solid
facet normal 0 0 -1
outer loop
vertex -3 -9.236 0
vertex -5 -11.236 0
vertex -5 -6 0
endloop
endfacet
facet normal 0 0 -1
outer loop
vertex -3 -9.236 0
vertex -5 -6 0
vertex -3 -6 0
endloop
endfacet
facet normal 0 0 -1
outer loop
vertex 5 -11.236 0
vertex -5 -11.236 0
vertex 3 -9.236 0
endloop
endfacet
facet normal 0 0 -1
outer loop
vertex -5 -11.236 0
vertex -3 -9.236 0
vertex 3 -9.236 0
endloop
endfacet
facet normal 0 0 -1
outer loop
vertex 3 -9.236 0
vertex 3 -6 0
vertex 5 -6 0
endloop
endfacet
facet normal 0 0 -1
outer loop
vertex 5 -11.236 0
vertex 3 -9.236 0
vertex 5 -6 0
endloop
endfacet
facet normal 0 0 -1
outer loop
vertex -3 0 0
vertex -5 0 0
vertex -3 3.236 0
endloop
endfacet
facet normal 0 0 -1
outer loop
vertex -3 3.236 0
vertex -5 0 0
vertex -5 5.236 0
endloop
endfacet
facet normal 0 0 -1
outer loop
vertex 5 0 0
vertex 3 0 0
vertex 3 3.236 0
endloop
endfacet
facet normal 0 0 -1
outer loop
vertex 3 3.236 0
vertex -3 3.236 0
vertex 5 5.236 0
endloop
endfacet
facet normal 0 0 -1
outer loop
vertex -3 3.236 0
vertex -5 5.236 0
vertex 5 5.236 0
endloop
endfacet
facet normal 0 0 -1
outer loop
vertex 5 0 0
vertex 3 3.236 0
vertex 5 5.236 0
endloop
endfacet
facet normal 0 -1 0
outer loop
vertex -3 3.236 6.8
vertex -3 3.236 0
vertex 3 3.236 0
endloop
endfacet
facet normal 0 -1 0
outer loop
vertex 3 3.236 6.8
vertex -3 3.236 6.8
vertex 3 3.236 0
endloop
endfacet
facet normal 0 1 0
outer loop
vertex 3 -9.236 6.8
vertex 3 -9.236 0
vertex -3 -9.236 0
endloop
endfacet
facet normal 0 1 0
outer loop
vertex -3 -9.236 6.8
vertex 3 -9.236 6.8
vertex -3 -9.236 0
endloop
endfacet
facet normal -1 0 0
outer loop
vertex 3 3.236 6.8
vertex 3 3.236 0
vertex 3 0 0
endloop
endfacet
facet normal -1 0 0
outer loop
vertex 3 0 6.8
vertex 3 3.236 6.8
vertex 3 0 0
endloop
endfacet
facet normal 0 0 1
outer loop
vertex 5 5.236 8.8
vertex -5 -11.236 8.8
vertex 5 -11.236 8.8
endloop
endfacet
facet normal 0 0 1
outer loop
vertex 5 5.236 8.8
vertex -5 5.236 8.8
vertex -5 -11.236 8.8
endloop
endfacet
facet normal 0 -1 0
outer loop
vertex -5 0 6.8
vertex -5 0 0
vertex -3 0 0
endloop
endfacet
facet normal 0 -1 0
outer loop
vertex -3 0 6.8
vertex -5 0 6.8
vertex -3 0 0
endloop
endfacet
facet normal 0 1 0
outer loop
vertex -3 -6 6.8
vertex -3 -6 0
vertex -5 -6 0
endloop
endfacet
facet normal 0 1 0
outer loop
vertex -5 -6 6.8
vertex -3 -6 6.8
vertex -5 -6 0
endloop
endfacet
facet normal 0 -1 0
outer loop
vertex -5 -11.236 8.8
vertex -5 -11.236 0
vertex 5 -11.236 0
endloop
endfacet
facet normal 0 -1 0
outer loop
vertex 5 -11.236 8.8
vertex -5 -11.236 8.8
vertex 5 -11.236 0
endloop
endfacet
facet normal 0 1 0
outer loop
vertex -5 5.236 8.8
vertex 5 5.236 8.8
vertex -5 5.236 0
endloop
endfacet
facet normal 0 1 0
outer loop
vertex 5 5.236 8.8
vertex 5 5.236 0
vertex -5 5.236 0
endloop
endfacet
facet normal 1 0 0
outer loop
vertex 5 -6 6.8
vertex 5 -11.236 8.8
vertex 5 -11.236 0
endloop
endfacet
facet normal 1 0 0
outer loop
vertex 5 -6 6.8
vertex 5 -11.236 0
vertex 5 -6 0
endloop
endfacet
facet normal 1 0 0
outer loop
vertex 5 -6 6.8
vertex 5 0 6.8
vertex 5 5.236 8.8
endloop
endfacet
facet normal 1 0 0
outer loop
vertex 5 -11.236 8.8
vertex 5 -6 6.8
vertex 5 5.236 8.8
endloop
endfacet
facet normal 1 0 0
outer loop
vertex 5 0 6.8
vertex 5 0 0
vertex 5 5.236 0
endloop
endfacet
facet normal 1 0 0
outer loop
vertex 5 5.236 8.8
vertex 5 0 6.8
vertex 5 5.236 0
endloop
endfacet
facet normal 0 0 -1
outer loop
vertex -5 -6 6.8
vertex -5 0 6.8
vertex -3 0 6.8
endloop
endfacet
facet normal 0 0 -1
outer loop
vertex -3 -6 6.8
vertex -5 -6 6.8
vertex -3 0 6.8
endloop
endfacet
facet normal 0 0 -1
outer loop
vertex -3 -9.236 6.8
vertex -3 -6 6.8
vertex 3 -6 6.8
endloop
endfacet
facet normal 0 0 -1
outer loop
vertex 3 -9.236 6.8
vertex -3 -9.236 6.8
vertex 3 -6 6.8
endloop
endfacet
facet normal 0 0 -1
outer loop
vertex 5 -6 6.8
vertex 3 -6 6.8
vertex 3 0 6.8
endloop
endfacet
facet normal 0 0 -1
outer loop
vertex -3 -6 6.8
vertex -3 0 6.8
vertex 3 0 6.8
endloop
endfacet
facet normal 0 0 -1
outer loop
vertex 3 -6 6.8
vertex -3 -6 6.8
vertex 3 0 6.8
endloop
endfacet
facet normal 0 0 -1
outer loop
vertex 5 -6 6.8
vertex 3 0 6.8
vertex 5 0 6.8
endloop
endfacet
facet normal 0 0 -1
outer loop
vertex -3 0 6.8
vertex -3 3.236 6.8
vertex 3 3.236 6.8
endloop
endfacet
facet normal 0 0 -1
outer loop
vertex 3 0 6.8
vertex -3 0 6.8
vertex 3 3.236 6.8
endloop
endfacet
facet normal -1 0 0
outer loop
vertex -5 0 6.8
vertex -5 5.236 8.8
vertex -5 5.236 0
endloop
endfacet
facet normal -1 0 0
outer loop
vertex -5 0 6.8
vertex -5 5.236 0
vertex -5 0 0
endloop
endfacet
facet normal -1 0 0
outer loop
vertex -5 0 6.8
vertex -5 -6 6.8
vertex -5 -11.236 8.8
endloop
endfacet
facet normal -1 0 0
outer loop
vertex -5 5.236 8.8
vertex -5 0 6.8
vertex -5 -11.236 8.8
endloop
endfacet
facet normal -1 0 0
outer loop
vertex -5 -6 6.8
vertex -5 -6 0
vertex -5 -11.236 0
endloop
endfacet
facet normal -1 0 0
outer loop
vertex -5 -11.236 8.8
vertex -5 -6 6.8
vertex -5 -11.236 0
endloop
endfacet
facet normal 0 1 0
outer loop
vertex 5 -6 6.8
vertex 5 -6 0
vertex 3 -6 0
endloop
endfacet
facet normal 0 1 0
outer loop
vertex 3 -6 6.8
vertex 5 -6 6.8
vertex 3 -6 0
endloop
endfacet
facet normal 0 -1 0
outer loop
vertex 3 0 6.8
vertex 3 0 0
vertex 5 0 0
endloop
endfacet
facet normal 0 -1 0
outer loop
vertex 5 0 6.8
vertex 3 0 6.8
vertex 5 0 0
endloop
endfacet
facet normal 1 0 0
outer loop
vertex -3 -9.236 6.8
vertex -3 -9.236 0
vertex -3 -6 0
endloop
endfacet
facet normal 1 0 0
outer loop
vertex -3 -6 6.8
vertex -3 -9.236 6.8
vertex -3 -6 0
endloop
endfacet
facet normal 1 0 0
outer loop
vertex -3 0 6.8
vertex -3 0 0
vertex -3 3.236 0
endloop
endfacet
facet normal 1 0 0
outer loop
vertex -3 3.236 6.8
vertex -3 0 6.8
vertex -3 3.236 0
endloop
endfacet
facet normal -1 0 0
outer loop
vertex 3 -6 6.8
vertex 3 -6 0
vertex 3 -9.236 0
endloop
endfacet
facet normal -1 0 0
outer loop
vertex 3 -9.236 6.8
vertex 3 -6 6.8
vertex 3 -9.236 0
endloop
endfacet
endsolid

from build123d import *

# Parameters (mm, degrees)
F1_DEPTH = 6.8
F3_DEPTH = 2


with BuildPart() as f1:
    # F0 (on Top) → F1 (new body)
    with BuildSketch(Plane.XY):
        Polygon((-5, 5.236), (-5, 0), (-3, 0), (-3, 3.236), (0, 3.236), (3, 3.236), (3, 0), (5, 0), (5, 5.236), (0, 5.236), align=None)
    extrude(amount=F1_DEPTH)



with BuildPart() as f1b:
    # F0 (on Top) → F1, piece 2 (new body)
    with BuildSketch(Plane.XY):
        Polygon((-3, -6), (-5, -6), (-5, -11.236), (0, -11.236), (5, -11.236), (5, -6), (3, -6), (3, -9.236), (0, -9.236), (-3, -9.236), align=None)
    extrude(amount=F1_DEPTH)


with BuildPart() as f1_1:
    add(f1.part)

    add(f1b.part)  # F3 merges F1b
    # F2 (on face) → F3 (join)
    with BuildSketch(Plane.XY.offset(6.8)):
        Polygon((-3, 0), (-5, 0), (-5, -11.236), (5, -11.236), (5, 0), (3, 0), (3, 3.236), (-3, 3.236), align=None)
        Polygon((5, 5.236), (-5, 5.236), (-5, 0), (-3, 0), (-3, 3.236), (3, 3.236), (3, 0), (5, 0), align=None)
    extrude(amount=F3_DEPTH)


solid = f1_1.part
